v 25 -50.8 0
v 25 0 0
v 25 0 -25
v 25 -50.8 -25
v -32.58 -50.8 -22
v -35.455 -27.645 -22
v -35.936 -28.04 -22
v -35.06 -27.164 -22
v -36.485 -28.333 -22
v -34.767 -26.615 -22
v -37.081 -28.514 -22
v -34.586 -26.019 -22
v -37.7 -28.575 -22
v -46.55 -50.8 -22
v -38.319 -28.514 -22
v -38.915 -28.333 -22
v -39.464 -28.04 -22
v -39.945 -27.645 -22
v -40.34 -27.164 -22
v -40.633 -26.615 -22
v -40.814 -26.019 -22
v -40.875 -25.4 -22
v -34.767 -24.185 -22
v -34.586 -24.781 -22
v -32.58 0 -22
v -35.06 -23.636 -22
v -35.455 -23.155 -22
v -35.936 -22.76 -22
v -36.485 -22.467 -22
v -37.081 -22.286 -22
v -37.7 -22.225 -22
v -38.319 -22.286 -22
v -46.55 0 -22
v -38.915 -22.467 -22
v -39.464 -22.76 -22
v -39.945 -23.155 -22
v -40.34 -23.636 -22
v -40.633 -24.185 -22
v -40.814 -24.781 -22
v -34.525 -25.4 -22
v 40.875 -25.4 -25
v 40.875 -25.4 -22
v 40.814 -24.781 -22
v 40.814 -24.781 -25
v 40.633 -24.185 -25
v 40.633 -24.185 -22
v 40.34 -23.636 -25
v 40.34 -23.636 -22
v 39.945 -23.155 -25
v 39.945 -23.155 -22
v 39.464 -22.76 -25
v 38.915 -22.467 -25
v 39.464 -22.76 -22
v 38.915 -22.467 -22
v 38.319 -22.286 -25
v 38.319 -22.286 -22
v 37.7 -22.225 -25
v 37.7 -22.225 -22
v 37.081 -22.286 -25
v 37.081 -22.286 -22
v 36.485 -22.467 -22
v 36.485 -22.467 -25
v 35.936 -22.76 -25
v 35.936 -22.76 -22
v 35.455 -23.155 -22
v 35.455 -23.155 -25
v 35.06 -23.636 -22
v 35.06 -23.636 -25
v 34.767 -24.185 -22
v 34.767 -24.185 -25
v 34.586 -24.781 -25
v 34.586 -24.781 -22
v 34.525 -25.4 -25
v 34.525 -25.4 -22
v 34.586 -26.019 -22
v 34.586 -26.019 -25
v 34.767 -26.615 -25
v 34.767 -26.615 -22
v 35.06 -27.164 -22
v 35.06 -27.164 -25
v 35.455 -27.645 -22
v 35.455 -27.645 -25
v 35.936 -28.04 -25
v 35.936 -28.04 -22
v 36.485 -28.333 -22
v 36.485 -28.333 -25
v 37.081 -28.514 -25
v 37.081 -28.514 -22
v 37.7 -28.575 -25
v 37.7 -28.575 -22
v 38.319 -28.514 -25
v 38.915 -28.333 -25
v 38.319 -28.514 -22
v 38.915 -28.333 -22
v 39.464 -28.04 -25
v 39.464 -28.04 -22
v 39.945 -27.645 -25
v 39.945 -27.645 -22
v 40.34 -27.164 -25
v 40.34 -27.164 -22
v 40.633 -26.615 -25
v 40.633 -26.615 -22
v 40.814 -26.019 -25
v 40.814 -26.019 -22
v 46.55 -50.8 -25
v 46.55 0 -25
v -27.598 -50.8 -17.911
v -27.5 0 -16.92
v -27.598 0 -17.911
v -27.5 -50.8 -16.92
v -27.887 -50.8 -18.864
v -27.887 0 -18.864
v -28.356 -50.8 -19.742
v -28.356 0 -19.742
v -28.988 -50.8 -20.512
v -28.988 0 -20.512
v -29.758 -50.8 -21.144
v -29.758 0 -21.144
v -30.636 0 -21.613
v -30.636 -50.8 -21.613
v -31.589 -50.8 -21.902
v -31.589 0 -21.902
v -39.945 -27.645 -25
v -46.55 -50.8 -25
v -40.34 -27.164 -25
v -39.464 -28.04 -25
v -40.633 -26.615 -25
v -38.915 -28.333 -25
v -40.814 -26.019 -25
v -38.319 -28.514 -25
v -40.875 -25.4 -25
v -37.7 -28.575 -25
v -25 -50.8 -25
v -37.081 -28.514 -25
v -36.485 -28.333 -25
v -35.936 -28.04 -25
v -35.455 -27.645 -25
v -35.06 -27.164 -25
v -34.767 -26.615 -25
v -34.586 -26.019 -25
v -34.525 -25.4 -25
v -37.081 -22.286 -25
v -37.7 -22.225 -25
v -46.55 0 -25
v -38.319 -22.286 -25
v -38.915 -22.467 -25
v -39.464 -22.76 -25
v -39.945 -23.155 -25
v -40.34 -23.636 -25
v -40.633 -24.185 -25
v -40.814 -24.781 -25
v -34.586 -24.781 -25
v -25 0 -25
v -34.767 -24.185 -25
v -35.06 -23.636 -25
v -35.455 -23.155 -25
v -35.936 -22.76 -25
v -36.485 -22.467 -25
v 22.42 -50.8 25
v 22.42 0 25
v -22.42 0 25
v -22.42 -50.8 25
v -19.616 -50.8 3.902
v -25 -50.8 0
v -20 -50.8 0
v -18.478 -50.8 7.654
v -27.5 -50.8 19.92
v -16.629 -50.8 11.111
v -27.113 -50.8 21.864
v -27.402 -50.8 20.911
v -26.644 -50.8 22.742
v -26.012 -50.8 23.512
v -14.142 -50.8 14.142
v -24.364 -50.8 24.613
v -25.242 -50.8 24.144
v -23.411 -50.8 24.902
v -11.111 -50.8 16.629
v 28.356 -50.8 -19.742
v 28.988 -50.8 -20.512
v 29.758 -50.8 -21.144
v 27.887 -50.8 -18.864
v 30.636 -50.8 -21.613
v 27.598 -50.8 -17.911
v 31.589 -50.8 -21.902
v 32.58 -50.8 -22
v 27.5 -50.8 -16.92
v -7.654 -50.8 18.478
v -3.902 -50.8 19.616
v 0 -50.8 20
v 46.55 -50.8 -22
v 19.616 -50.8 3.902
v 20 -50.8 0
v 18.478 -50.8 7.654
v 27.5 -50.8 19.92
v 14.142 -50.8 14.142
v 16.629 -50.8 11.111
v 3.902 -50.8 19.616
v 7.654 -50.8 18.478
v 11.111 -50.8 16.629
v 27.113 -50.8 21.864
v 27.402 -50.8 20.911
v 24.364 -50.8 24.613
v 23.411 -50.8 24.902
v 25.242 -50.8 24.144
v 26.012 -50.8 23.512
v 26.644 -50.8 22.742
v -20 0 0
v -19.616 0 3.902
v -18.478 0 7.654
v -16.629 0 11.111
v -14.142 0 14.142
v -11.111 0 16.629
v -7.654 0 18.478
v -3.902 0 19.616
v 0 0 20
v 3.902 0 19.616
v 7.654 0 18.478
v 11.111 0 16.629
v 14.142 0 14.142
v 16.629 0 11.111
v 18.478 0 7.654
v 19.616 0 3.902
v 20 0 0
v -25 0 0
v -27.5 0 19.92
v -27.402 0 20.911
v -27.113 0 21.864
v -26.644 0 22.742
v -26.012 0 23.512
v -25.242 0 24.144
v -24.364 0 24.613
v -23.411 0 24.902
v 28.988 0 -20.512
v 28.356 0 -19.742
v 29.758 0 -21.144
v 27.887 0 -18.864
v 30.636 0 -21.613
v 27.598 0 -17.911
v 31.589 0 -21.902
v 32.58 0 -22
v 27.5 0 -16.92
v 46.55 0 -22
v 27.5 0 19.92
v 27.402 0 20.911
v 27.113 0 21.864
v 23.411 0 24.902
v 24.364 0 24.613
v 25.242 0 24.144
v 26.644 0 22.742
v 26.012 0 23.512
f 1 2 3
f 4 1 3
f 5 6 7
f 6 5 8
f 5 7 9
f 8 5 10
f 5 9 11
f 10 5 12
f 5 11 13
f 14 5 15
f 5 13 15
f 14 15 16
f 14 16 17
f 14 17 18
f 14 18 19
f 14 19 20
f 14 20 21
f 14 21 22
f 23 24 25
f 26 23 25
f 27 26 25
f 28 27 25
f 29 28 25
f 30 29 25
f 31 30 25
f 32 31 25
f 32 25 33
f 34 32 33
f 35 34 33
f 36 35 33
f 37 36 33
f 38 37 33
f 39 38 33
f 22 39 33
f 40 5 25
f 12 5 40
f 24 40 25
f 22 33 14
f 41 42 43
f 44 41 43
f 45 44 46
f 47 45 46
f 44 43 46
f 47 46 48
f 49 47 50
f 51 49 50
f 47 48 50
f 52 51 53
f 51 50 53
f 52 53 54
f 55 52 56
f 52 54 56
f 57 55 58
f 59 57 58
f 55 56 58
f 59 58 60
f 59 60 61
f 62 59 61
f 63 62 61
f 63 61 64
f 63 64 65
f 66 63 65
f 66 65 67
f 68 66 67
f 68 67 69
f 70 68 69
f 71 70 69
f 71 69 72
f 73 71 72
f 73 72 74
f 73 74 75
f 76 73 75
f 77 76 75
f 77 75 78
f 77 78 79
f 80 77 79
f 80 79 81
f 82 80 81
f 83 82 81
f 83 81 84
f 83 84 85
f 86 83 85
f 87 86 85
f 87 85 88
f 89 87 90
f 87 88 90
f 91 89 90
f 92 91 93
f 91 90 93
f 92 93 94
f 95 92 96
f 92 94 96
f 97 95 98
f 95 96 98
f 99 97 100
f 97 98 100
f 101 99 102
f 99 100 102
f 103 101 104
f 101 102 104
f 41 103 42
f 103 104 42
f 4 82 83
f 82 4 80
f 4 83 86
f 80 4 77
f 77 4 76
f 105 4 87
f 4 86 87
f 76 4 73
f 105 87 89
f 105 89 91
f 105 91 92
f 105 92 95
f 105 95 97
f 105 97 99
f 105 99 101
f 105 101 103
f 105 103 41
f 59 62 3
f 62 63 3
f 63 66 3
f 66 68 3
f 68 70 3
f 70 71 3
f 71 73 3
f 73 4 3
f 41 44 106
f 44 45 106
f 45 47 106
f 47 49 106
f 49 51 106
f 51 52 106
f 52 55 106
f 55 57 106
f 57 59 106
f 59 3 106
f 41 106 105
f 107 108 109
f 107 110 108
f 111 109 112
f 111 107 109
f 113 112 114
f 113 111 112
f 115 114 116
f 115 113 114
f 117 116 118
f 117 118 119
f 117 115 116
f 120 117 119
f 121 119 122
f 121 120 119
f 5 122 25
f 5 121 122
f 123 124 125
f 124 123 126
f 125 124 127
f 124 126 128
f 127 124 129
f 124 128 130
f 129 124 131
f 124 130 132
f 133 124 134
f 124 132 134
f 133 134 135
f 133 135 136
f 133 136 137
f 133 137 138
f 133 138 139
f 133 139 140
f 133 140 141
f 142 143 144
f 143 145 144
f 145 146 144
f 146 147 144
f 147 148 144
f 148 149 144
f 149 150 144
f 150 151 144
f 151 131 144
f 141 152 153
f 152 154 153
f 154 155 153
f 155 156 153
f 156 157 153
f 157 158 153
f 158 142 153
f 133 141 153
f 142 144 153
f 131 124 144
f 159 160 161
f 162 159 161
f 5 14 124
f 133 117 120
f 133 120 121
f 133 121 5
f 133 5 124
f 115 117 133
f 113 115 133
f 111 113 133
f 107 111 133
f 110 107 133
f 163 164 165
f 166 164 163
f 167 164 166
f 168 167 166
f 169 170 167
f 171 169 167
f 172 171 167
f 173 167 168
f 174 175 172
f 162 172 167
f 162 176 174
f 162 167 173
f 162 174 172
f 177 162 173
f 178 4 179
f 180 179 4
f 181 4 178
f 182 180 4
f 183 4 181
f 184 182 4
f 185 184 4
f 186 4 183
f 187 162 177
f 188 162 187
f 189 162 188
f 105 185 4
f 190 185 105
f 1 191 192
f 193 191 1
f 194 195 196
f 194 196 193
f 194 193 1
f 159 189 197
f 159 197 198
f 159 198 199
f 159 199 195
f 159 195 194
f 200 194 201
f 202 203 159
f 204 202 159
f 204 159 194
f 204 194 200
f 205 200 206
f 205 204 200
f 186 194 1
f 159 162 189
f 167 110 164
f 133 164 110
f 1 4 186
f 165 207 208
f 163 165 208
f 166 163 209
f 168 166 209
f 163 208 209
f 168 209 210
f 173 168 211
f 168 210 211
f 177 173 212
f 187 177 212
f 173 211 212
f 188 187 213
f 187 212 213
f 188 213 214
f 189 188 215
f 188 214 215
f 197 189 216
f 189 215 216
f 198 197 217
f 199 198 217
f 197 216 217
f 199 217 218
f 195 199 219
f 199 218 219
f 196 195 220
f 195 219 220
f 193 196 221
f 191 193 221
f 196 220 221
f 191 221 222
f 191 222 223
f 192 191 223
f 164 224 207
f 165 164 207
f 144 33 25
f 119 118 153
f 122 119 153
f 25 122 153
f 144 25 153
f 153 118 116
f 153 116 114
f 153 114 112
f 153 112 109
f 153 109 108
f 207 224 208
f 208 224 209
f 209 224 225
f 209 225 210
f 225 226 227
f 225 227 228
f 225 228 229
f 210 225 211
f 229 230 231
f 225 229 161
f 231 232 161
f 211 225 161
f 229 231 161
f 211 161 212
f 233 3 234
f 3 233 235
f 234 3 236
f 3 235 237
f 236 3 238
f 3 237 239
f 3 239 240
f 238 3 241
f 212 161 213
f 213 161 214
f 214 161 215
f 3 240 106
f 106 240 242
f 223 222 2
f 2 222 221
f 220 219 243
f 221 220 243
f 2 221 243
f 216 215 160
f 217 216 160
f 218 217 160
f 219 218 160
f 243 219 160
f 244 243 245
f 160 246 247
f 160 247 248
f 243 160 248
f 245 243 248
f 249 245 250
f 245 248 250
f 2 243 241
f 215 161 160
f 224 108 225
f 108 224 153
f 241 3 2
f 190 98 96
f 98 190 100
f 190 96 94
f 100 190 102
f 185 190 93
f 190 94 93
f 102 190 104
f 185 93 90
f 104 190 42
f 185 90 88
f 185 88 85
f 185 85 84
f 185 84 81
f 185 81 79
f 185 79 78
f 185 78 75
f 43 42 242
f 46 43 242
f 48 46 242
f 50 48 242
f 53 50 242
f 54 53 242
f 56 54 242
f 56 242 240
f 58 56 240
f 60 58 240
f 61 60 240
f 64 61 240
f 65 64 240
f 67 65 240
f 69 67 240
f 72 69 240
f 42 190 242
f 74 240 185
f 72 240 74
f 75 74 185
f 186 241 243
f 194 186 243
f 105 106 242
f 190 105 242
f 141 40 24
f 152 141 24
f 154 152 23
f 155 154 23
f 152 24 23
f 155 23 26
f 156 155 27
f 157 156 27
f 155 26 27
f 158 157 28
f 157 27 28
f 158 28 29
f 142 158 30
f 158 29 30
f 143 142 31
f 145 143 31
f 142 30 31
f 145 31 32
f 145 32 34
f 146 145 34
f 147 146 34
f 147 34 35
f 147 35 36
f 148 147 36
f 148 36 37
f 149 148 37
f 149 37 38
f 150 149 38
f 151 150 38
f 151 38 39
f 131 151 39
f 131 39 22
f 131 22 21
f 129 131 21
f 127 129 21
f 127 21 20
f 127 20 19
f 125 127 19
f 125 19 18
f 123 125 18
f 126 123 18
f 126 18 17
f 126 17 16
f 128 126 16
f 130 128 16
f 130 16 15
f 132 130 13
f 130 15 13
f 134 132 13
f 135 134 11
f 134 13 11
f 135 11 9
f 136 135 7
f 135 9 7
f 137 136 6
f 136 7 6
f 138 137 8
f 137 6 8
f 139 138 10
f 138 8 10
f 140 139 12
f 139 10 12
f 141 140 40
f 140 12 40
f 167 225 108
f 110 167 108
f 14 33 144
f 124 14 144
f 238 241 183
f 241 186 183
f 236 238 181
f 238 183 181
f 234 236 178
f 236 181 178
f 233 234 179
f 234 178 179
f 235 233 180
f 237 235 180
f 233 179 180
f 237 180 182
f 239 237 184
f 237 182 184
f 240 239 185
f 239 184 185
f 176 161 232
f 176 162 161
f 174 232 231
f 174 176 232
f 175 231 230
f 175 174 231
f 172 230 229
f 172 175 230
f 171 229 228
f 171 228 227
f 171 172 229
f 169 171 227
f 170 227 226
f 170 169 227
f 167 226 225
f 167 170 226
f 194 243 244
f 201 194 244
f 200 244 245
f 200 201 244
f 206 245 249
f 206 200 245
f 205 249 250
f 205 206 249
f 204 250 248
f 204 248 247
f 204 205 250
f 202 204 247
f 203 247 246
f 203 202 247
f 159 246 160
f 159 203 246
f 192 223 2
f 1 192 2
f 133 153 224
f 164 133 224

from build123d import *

# Parameters (mm, degrees)
F1_DEPTH = 50.8
F2_R     = 5.08
F3_R     = 5.08
F4_R     = 3.175
F5_DEPTH = 25.4


with BuildPart() as f1:
    # F0 (on Front) → F1 (new body)
    with BuildSketch(Plane.XZ):
        with BuildLine():
            Line((-25, -25), (-25, 0))
            Line((-25, 0), (-20, 0))
            ThreePointArc((-20, 0), (0, 20), (20, 0))
            Line((20, 0), (25, 0))
            Line((25, 0), (25, -25))
            Line((25, -25), (46.55, -25))
            Line((46.55, -25), (46.55, -22))
            Line((46.55, -22), (27.5, -22))
            Line((27.5, -22), (27.5, 0))
            Line((27.5, 0), (27.5, 25))
            Line((27.5, 25), (-27.5, 25))
            Line((-27.5, 25), (-27.5, 0))
            Line((-27.5, 0), (-27.5, -22))
            Line((-27.5, -22), (-46.55, -22))
            Line((-46.55, -22), (-46.55, -25))
            Line((-46.55, -25), (-25, -25))
        make_face()
    extrude(amount=F1_DEPTH)

    # F2
    f2_edges = [f1.edges().sort_by_distance(p)[0] for p in [
        (-27.5, -25.4, 25),
        (27.5, -25.4, 25),
    ]]
    fillet(f2_edges, radius=F2_R)

    # F3
    f3_edges = [f1.edges().sort_by_distance(p)[0] for p in [
        (-27.5, -25.4, -22),
        (27.5, -25.4, -22),
    ]]
    fillet(f3_edges, radius=F3_R)

    # F4 (on face) → F5 (cut)
    with BuildSketch(Plane.XY.offset(-22)):
        with Locations((-37.7, -25.4)):
            Circle(F4_R)
        with Locations((37.7, -25.4)):
            Circle(F4_R)
    extrude(amount=-F5_DEPTH, mode=Mode.SUBTRACT)


solid = f1.part
